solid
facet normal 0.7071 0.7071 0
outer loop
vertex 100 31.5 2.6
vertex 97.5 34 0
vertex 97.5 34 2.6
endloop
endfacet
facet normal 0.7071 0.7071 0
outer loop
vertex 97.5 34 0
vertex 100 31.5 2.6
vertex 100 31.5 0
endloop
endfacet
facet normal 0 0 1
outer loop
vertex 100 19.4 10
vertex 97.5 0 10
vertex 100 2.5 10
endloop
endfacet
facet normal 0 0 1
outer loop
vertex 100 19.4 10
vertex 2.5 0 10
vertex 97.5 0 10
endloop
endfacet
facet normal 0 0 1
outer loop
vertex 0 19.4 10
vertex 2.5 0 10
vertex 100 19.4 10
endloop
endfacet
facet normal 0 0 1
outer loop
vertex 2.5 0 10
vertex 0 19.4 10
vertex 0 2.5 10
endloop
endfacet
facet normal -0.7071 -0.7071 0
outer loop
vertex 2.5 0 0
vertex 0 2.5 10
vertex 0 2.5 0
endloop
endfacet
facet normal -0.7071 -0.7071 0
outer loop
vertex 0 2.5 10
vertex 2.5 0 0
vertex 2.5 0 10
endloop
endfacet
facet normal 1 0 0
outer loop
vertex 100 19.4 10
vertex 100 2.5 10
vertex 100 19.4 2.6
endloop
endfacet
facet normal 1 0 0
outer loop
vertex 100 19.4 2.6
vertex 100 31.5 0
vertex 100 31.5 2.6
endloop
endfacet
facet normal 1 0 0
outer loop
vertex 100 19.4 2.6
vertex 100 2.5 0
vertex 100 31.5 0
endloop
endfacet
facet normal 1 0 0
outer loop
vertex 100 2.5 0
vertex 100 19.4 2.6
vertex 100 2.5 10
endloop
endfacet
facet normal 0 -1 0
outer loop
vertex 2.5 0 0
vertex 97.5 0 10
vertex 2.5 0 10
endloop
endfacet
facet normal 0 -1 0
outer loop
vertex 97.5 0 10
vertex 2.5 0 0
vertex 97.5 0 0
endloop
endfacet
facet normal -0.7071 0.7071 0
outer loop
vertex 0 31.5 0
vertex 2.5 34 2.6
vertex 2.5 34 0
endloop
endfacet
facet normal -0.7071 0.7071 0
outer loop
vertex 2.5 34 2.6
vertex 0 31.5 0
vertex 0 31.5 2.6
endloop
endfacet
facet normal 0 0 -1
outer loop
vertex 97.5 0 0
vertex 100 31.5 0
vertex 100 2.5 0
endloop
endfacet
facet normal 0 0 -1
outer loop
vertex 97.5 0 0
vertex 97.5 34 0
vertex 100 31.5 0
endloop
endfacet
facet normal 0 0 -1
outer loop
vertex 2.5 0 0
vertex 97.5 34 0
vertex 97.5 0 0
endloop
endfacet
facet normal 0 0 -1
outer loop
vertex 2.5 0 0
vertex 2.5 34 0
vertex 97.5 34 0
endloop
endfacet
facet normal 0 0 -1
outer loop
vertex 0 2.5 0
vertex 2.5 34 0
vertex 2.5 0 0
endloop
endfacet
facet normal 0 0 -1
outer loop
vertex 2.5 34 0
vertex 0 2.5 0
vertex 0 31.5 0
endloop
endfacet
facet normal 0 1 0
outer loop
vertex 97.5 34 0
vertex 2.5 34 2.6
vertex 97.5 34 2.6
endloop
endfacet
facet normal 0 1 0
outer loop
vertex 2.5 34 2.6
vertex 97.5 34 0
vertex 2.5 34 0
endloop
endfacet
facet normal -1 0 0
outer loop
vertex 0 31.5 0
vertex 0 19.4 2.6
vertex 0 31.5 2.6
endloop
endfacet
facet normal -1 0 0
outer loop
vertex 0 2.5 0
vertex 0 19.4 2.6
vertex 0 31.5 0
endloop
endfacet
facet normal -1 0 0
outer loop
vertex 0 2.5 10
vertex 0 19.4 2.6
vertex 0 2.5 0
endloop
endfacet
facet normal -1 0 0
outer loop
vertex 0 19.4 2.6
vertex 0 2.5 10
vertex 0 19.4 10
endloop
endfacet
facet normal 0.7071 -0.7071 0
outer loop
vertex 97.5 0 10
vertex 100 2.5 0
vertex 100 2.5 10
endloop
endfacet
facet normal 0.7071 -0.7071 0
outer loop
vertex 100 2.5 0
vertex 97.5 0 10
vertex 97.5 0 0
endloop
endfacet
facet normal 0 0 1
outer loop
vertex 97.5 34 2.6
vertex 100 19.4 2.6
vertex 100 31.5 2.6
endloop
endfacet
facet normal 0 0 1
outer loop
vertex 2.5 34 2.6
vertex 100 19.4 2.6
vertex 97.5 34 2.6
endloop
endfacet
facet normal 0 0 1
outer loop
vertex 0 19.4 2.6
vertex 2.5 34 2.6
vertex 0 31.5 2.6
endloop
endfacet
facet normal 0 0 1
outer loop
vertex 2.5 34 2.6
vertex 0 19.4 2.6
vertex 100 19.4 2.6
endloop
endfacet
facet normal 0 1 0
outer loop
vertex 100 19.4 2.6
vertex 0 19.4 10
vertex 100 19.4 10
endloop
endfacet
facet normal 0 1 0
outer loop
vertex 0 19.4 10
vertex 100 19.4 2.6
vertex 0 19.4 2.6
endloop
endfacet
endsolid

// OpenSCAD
$fn = 32;

// ----------------------------------------------------------------------
// Stepped bar: sidestep, 100 x 34 x 10/2.6 mm
// ----------------------------------------------------------------------

// --- parameters (mm) ---
bar_l = 100;              // bar length, X
bar_w = 34;               // bar width, Y
plate_t = 10;             // thickness of the thick zone, Z
thin_t = 2.6;             // thickness of the thin zone
corner_c = 2.5;           // corner chamfer of the bar
step_cut = 7.4;           // material removed from the thin zone
ledge_y = 19.4;           // start of the ledge from the front edge
depth_1 = 7.4;            // depth of cut 1 from the top face

profile = [[2.5, 0], [97.5, 0], [100, 2.5], [100, 31.5], [97.5, 34], [2.5, 34], [0, 31.5], [0, 2.5]];  // primary outline, 8 points, counter clockwise
void_1 = [[-1, 19.4], [101, 19.4], [101, 35], [-1, 35]];  // ledge cut along one edge, 4 points

// --- the one profile operation ---
difference() {
  linear_extrude(height = plate_t) polygon(points = profile);
  translate([0, 0, plate_t - depth_1])
    linear_extrude(height = depth_1 + 1) polygon(points = void_1);
}
